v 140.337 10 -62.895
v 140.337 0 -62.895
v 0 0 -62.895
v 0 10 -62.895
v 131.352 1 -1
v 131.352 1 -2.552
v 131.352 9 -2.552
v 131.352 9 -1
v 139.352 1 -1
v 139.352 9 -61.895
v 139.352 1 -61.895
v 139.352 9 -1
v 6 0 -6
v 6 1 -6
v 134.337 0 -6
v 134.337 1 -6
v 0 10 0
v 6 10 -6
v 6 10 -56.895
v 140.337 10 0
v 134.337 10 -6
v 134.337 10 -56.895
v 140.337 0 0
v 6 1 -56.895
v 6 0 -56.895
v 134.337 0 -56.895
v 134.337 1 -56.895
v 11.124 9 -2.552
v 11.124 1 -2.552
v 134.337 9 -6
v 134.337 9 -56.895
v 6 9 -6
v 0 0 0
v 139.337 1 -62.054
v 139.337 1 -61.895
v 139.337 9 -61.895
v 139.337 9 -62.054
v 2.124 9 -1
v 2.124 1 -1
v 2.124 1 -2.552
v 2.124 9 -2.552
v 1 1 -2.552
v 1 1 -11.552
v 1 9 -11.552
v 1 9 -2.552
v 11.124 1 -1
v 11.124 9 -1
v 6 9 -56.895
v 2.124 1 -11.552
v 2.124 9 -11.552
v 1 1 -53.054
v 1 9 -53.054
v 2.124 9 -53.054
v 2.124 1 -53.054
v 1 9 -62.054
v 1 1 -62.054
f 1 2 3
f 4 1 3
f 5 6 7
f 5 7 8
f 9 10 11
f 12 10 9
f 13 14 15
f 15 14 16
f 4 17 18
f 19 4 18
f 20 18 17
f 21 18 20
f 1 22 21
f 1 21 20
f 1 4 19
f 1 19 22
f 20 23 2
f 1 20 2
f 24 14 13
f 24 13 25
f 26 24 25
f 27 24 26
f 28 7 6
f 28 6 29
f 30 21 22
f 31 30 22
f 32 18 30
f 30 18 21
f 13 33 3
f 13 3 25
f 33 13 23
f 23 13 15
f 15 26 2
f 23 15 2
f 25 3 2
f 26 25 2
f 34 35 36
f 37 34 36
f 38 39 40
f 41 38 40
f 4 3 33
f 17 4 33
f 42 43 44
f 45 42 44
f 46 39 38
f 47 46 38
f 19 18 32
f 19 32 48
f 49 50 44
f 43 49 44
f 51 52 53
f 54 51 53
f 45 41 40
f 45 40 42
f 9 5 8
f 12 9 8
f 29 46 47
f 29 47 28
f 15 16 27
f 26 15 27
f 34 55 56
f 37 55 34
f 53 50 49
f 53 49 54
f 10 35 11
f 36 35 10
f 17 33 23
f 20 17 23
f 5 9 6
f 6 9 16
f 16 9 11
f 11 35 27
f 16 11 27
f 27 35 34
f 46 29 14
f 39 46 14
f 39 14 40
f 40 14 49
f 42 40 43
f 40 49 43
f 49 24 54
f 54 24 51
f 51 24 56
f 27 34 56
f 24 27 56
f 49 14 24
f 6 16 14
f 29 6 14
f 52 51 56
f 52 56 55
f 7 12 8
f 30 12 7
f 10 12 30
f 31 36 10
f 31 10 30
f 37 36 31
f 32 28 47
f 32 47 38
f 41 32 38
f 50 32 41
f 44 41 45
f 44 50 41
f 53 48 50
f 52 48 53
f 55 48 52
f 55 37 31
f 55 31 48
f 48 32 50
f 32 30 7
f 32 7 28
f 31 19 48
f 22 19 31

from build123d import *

# Parameters (mm, degrees)
SKETCH7_W           = 120.227524024
SKETCH7_H           = 41.502027866
BOSS_EXTRUDE4_DEPTH = 10
SKETCH9_W           = 60.894825735
SKETCH9_H           = 8
CUT_EXTRUDE4_DEPTH  = 9
SKETCH12_W          = 60.894825735
SKETCH12_H          = 8
CUT_EXTRUDE6_DEPTH  = 8
SKETCH14_W          = 138.336754021
SKETCH14_H          = 8
CUT_EXTRUDE7_DEPTH  = 9
SKETCH17_W          = 138.336754021
SKETCH17_H          = 8
CUT_EXTRUDE8_DEPTH  = 9
SKETCH20_W          = 128.336754021
SKETCH20_H          = 50.894825735
CUT_EXTRUDE10_DEPTH = 10


with BuildPart() as part:
    # Sketch7 → Boss-Extrude4 (new body)
    with BuildSketch(Plane(origin=(0, 0, 0), x_dir=(1, 0, 0), z_dir=(0, 1, 0))):
        Polygon((0, 0), (11.124254892, 0), (131.351778916, 0), (140.336754021, 0), (140.336754021, 62.894825735), (131.351778916, 62.894825735), (11.124254892, 62.894825735), (0, 62.894825735), align=None)
        with Locations((71.238016904, 32.303124782)):
            Rectangle(SKETCH7_W, SKETCH7_H, mode=Mode.SUBTRACT)
    extrude(amount=BOSS_EXTRUDE4_DEPTH)

    # Sketch9 → Cut-Extrude4 (cut)
    with BuildSketch(Plane(origin=(11.124254892, 0, 0), x_dir=(0, 0, -1), z_dir=(1, 0, 0))):
        with Locations((31.447412868, 5)):
            Rectangle(SKETCH9_W, SKETCH9_H)
    extrude(amount=-CUT_EXTRUDE4_DEPTH, mode=Mode.SUBTRACT)

    # Sketch12 → Cut-Extrude6 (cut)
    with BuildSketch(Plane.ZY.offset(-131.351778916)):
        with Locations((-31.447412868, 5)):
            Rectangle(SKETCH12_W, SKETCH12_H)
    extrude(amount=-CUT_EXTRUDE6_DEPTH, mode=Mode.SUBTRACT)

    # Sketch14 → Cut-Extrude7 (cut)
    with BuildSketch(Plane.XY.offset(-53.054138715)):
        with Locations((70.168377011, 5)):
            Rectangle(SKETCH14_W, SKETCH14_H)
    extrude(amount=-CUT_EXTRUDE7_DEPTH, mode=Mode.SUBTRACT)

    # Sketch17 → Cut-Extrude8 (cut)
    with BuildSketch(Plane(origin=(0, 0, -11.552110849), x_dir=(-1, 0, 0), z_dir=(0, 0, -1))):
        with Locations((-70.168377011, 5)):
            Rectangle(SKETCH17_W, SKETCH17_H)
    extrude(amount=-CUT_EXTRUDE8_DEPTH, mode=Mode.SUBTRACT)

    # Sketch20 → Cut-Extrude10 (cut)
    with BuildSketch(Plane(origin=(0, 10, 0), x_dir=(1, 0, 0), z_dir=(0, 1, 0))):
        with Locations((70.168377011, 31.447412868)):
            Rectangle(SKETCH20_W, SKETCH20_H)
    extrude(amount=-CUT_EXTRUDE10_DEPTH, mode=Mode.SUBTRACT)


solid = part.part
